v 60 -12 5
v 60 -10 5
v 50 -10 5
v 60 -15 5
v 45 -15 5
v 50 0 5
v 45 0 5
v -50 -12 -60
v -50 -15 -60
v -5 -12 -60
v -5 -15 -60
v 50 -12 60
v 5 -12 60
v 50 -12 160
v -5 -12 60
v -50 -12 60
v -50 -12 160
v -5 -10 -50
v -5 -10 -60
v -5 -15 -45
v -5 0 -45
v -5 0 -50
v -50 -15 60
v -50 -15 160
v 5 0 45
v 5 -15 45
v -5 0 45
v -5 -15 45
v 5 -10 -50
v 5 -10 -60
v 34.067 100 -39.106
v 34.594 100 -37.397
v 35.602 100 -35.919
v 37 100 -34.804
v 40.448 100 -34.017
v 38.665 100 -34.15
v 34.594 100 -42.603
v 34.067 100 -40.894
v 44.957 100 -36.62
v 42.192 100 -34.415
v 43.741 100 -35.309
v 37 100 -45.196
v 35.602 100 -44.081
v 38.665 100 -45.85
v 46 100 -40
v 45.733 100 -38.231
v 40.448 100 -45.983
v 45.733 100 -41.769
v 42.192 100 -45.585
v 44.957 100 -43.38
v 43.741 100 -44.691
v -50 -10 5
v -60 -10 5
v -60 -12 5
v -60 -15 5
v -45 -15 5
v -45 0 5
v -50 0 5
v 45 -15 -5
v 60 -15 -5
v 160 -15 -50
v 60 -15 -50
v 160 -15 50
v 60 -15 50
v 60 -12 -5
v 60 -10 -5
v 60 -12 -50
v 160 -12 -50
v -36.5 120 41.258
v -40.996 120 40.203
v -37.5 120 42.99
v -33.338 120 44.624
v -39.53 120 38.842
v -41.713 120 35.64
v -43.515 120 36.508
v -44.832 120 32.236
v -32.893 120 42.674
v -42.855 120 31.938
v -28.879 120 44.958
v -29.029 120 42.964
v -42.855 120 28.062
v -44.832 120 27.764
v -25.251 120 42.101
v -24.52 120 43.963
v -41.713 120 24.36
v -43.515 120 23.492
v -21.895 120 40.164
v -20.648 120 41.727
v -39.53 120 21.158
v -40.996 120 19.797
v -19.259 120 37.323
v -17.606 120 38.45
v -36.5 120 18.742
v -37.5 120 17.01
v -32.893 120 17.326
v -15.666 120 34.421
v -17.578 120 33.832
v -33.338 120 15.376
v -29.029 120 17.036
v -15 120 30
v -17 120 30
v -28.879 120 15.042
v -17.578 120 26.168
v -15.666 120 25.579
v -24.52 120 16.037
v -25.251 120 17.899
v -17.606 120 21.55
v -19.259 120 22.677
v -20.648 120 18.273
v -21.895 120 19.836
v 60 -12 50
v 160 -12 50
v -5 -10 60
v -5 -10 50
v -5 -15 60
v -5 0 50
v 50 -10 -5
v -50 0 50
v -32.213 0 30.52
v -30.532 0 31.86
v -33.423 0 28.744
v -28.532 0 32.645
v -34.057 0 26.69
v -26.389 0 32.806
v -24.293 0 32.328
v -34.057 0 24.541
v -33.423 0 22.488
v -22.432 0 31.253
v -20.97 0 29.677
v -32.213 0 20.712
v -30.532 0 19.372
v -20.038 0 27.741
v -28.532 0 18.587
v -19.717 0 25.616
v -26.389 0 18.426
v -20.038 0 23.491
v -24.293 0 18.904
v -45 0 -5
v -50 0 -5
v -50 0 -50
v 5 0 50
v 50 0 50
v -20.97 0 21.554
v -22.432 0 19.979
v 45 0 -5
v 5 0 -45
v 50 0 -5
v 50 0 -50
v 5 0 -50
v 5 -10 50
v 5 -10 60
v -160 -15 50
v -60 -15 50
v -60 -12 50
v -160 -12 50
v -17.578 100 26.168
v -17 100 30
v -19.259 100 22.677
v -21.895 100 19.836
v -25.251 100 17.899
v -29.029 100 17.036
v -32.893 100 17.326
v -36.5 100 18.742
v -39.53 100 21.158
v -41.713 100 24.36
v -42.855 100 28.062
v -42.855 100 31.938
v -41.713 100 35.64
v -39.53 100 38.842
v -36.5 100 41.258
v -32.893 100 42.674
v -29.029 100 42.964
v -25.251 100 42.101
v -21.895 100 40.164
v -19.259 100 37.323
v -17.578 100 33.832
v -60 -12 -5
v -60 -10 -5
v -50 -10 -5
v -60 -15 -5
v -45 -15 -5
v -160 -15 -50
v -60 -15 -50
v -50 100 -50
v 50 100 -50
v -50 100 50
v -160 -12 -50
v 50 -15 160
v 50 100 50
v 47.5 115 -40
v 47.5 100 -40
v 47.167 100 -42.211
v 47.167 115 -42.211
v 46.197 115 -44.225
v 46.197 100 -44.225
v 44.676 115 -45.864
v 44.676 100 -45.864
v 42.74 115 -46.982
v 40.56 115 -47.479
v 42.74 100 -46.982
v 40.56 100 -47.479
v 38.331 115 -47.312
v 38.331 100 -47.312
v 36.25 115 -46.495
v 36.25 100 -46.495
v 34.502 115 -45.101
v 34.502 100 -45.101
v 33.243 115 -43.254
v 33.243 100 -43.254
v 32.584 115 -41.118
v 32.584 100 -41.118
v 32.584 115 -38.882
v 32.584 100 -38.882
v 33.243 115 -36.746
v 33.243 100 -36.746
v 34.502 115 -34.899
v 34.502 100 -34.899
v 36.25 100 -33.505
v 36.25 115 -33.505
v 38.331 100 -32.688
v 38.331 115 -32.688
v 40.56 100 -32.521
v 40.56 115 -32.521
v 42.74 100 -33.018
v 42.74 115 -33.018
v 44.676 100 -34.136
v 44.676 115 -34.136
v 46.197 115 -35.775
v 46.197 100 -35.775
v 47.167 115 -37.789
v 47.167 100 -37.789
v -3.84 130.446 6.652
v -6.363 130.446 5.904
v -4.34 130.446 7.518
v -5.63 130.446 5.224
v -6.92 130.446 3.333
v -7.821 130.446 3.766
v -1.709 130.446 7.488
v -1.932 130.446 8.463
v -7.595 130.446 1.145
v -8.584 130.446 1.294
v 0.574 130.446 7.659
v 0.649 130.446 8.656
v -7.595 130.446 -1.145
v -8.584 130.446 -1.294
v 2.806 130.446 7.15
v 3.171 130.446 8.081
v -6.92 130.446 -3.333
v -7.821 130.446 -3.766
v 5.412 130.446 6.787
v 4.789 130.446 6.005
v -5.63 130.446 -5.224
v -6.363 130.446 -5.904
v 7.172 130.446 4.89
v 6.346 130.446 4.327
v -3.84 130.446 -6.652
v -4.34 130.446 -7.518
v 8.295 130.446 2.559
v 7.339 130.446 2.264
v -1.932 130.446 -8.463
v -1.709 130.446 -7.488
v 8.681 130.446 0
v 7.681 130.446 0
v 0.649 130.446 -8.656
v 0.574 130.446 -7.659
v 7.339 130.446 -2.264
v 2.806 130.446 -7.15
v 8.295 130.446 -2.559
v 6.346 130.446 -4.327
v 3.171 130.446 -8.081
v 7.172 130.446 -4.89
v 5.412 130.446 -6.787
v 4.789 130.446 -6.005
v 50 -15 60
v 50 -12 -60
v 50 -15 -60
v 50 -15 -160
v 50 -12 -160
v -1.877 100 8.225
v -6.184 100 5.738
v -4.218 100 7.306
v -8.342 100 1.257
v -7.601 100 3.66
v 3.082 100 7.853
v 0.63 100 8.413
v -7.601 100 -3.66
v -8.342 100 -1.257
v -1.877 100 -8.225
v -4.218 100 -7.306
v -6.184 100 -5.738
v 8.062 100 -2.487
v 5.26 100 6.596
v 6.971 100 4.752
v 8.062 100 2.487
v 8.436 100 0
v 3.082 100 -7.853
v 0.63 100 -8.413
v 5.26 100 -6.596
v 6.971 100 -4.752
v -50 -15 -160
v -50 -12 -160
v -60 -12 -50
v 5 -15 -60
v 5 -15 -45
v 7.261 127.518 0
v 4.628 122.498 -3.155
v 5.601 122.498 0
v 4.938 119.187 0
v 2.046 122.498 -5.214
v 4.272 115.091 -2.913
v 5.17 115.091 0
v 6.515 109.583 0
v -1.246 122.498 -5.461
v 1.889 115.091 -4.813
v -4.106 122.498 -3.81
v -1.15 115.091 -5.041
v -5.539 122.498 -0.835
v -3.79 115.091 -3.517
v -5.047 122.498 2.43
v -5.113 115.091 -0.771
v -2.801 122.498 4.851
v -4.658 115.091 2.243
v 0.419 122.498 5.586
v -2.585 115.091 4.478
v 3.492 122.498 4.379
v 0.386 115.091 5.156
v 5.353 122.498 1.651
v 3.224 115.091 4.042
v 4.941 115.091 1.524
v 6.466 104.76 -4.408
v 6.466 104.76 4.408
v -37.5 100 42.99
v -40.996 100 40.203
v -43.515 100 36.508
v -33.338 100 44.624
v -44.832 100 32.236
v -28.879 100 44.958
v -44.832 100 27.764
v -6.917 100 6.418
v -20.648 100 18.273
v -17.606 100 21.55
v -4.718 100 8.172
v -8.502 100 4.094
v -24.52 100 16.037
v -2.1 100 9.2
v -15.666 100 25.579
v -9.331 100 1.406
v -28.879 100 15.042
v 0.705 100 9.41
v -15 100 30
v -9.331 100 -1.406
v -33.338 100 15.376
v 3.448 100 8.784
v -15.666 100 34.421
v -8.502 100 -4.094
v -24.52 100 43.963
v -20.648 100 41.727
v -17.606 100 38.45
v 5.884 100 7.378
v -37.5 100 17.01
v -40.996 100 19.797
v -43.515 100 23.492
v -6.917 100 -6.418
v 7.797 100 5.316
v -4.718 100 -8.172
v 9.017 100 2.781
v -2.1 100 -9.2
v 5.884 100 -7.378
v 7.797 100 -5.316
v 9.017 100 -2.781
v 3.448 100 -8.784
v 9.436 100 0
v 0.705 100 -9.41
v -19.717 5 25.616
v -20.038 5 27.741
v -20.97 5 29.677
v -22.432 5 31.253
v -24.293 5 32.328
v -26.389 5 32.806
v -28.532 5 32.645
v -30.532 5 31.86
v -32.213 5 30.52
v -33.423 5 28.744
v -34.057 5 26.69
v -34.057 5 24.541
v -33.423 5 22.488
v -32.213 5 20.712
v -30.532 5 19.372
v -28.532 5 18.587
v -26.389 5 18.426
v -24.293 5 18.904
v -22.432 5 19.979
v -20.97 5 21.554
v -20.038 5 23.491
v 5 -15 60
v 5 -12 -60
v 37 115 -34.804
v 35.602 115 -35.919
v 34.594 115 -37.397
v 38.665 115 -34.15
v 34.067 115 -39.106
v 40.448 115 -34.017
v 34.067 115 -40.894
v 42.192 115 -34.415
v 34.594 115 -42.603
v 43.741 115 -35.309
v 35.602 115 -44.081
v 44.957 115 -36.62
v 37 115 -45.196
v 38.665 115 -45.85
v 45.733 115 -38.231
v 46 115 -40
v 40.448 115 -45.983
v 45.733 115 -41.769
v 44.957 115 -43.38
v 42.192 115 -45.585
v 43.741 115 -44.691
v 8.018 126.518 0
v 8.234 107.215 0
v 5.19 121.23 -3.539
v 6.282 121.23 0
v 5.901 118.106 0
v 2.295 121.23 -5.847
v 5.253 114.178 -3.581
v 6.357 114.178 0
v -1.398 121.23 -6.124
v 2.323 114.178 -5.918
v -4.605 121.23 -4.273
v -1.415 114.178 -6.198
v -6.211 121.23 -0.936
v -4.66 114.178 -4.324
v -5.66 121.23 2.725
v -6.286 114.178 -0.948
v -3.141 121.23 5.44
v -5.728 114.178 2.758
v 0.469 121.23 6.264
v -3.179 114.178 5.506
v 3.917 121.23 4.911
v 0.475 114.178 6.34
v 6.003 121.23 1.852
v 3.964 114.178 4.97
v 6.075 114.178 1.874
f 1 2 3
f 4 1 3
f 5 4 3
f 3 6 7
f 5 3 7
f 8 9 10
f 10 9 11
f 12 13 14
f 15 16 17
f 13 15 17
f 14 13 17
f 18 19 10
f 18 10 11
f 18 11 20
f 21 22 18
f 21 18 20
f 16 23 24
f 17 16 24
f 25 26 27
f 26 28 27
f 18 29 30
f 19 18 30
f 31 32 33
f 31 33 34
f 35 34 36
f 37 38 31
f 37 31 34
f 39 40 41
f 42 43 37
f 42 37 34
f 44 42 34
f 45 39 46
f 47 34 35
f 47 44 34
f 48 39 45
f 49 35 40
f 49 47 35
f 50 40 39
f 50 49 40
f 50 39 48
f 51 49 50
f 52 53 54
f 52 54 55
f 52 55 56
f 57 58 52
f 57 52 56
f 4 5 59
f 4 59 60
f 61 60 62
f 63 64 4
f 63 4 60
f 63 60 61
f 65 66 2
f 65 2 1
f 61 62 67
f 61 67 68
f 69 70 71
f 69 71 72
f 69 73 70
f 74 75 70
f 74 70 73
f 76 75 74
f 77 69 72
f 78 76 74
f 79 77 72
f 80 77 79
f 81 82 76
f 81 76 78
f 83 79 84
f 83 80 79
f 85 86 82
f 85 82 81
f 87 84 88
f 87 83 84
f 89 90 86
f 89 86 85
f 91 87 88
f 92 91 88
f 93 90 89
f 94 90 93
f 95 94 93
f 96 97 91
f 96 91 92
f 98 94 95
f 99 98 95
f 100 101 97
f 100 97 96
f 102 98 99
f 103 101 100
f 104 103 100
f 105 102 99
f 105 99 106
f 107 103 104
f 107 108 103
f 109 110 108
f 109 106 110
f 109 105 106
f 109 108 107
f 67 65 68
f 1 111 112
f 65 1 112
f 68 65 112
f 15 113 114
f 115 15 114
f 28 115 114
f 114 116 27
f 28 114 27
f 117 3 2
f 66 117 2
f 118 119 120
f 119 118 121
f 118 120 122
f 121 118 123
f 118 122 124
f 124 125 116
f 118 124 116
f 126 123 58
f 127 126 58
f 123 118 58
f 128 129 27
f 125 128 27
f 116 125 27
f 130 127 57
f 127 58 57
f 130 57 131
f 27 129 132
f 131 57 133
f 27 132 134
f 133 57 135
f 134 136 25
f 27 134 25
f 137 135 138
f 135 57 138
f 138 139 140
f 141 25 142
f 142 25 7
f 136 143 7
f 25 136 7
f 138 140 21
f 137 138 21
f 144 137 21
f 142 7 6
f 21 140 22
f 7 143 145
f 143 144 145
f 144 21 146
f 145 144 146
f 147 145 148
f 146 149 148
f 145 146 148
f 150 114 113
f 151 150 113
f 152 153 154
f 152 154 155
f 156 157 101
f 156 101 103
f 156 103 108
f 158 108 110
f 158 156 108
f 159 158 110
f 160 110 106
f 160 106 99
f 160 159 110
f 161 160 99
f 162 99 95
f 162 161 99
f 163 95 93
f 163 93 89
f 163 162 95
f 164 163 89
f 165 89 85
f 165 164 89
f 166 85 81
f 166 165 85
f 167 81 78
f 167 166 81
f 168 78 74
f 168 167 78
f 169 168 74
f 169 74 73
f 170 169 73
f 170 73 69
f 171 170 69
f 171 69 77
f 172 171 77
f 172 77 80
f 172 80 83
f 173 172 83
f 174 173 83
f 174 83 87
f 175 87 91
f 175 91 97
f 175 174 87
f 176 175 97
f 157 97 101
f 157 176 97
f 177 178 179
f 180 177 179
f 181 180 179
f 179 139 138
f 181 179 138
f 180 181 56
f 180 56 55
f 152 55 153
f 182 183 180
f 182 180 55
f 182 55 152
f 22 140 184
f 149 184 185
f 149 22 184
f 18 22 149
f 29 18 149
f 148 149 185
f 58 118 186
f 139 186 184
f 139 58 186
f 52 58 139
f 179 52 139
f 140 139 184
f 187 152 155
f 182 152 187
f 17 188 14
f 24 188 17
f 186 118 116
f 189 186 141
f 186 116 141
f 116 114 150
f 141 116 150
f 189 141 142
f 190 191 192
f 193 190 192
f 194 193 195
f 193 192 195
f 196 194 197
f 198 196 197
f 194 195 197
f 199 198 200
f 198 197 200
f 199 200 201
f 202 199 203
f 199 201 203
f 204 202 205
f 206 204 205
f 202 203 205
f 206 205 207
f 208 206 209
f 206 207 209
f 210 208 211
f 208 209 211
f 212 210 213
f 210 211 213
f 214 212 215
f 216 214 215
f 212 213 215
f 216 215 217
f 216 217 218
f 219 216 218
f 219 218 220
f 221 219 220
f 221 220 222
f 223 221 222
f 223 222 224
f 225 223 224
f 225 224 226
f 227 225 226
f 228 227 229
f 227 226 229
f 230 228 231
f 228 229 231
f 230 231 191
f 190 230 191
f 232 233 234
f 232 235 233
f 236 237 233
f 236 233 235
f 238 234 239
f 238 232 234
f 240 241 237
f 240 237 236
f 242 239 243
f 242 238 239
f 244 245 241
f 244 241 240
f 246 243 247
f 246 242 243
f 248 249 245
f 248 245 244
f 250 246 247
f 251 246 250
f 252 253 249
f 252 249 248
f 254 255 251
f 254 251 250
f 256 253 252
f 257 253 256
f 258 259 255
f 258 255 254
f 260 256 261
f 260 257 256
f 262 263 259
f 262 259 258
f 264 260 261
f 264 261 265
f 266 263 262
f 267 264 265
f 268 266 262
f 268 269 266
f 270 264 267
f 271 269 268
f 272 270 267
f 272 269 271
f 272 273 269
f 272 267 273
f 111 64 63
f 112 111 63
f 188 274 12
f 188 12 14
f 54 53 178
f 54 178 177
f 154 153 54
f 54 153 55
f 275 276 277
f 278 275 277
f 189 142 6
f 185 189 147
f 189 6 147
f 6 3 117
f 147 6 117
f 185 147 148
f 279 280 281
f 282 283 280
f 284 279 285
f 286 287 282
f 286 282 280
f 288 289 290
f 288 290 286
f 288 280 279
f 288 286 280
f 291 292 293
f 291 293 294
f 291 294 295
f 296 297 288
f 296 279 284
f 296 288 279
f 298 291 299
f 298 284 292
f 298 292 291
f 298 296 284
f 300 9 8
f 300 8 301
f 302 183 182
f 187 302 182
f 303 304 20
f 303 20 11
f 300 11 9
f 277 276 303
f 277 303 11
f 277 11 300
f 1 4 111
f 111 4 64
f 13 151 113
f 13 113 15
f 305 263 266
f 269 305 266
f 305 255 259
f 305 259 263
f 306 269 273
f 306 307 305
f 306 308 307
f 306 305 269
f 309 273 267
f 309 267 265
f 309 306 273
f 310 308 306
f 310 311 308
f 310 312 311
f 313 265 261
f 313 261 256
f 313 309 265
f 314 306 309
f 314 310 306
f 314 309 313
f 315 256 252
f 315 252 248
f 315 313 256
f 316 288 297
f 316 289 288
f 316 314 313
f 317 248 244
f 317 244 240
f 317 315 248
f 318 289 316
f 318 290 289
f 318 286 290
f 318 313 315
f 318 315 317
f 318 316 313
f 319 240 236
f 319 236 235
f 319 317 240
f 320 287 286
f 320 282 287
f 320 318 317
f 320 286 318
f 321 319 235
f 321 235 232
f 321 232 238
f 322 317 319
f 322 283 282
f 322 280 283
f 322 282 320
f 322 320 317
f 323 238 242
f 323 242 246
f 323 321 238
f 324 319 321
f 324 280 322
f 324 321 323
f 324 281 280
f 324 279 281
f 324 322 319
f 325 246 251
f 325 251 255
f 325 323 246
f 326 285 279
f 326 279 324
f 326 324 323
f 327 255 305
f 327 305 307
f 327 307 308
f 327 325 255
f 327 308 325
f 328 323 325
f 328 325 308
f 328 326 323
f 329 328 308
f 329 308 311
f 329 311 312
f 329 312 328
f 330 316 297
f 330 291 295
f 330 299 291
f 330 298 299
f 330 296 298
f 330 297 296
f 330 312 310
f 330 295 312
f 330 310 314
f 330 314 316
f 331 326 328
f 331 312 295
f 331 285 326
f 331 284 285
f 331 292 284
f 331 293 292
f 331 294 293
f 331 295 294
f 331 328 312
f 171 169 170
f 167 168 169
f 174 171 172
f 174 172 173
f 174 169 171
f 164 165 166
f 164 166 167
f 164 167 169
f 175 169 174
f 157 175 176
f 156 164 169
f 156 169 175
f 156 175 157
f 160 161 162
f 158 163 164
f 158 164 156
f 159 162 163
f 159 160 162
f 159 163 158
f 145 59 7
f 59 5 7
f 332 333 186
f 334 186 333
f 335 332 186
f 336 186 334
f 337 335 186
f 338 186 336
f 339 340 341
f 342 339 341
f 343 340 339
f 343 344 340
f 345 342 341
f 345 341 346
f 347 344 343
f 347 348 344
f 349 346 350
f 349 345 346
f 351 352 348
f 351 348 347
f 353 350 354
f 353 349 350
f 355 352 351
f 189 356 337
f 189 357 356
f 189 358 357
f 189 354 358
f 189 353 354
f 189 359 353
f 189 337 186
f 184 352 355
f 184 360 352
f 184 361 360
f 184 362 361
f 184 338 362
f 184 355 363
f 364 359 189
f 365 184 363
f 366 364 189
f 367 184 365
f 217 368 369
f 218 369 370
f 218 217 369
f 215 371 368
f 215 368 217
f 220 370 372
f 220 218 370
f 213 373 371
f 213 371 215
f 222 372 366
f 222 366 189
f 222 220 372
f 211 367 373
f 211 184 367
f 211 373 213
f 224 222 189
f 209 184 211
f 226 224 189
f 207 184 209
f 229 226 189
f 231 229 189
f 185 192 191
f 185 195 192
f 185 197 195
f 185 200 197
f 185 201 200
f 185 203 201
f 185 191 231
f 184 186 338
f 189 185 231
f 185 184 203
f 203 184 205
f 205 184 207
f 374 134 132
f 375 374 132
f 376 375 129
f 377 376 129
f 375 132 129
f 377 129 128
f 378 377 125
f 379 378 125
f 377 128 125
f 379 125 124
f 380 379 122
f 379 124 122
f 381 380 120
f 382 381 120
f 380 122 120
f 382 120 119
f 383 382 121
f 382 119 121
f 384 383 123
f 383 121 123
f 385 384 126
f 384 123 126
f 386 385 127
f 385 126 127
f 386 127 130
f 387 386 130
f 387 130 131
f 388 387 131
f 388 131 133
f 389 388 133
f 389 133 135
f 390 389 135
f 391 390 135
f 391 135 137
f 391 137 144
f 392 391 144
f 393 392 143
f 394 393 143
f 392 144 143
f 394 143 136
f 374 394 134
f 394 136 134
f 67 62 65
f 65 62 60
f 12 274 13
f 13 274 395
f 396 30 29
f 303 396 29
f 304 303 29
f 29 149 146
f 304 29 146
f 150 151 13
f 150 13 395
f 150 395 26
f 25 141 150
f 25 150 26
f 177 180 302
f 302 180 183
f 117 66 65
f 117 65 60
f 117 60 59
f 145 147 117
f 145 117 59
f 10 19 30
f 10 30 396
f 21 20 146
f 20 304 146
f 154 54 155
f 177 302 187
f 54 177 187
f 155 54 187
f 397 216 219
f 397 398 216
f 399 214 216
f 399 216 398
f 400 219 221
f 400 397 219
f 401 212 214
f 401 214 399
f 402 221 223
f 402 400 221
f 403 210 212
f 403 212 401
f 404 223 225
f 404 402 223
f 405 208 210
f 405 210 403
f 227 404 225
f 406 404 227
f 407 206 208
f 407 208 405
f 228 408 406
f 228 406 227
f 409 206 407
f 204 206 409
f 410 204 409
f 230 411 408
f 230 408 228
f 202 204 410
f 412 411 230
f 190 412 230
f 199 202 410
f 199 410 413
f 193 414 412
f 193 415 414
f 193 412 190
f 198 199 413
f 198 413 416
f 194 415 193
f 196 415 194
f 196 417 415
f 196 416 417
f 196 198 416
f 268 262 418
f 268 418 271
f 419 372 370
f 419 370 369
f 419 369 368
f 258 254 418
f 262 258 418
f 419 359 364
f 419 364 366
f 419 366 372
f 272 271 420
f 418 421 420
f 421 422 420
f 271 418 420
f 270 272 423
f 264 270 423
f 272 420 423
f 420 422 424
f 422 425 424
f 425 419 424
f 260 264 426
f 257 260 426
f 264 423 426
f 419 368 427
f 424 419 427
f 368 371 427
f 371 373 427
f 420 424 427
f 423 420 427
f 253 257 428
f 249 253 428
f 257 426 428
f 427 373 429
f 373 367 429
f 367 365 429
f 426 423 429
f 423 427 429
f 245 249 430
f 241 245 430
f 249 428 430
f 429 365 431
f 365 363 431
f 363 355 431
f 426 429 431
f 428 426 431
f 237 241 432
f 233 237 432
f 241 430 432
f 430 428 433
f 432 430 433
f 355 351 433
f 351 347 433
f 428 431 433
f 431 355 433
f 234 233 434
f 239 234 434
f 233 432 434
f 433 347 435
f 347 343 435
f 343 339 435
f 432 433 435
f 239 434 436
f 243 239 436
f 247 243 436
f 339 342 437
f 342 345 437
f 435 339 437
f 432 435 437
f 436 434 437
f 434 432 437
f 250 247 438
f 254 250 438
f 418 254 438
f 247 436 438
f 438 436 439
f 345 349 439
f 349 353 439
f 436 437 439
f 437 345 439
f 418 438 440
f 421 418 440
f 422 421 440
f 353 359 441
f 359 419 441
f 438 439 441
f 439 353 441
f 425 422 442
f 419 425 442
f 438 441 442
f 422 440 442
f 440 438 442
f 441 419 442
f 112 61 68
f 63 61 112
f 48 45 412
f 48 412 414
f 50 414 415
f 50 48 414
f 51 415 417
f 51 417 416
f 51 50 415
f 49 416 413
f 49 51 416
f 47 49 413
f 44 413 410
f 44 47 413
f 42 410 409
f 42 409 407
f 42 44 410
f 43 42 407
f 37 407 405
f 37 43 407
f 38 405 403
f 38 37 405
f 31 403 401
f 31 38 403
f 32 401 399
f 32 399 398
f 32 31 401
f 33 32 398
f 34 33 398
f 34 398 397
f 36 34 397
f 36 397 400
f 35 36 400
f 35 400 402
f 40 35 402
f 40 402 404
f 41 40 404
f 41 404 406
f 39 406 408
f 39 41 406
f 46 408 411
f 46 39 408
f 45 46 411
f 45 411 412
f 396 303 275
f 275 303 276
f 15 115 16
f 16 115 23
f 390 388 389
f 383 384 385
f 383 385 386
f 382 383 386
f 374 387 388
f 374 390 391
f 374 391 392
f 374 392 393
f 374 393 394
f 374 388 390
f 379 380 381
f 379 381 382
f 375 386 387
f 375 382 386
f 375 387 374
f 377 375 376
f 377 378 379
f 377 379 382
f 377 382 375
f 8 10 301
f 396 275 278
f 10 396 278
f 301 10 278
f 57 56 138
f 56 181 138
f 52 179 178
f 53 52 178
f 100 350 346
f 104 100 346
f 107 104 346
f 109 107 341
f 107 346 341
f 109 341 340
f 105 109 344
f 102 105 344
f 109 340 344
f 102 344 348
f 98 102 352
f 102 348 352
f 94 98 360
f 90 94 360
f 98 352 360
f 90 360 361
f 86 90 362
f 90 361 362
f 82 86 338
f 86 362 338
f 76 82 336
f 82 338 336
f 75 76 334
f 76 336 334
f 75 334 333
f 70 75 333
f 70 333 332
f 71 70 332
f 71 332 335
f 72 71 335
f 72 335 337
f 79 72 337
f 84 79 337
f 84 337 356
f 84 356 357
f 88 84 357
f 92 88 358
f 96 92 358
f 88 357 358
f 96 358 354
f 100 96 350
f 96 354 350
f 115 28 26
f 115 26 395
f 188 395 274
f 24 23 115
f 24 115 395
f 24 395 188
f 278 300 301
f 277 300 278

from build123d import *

# Parameters (mm, degrees)
SKETCH_1_W               = 100
SKETCH_1_H               = 100
EXTRUDE_1_DEPTH          = 100
EXTRUDE_2_DEPTH          = 5
SKETCH_4_W               = 100
SKETCH_4_H               = 100
EXTRUDE_3_DEPTH          = 3
PATTERN_CIRCULAR_1_COUNT = 4
SKETCH_7_R               = 15
SKETCH_7_R_2             = 13
EXTRUDE_5_DEPTH          = 20
SKETCH_8_R               = 7.5
SKETCH_8_R_2             = 6
EXTRUDE_6_DEPTH          = 15
SKETCH_11_R              = 7.210019968
CUT_EXTRUDE_2_DEPTH      = 5


with BuildPart() as part:
    # Эскиз1 → Бобышка-Вытянуть1 (new body)
    with BuildSketch(Plane(origin=(0, 0, 0), x_dir=(1, 0, 0), z_dir=(0, 1, 0))):
        Rectangle(SKETCH_1_W, SKETCH_1_H)
    extrude(amount=EXTRUDE_1_DEPTH)

    # Эскиз3 → Бобышка-Вытянуть2 (add, symmetric)
    with BuildSketch(Plane.XY):
        Polygon((60, -10), (60, -15), (45, -15), (45, 0), (50, 0), (50, -10), align=None)
    extrude_2 = extrude(amount=EXTRUDE_2_DEPTH, both=True)

    # Эскиз4 → Бобышка-Вытянуть3 (add)
    with BuildSketch(Plane.XZ.offset(15)):
        with Locations((110, 0)):
            Rectangle(SKETCH_4_W, SKETCH_4_H)
    extrude_3 = extrude(amount=-EXTRUDE_3_DEPTH)

    # Круговой массив1: Бобышка-Вытянуть2, Бобышка-Вытянуть3 ×4 about axis
    pattern_circular_1_axis = Axis((0, 0, 0), (0, 1, 0))
    for i in range(1, PATTERN_CIRCULAR_1_COUNT):
        add(extrude_2.rotate(pattern_circular_1_axis, i * 360 / PATTERN_CIRCULAR_1_COUNT))
        add(extrude_3.rotate(pattern_circular_1_axis, i * 360 / PATTERN_CIRCULAR_1_COUNT))

    # Эскиз7 → Бобышка-Вытянуть5 (add)
    with BuildSketch(Plane(origin=(0, 100, 0), x_dir=(1, 0, 0), z_dir=(0, 1, 0))):
        with Locations((-30, -30)):
            Circle(SKETCH_7_R)
        with Locations((-30, -30)):
            Circle(SKETCH_7_R_2, mode=Mode.SUBTRACT)
    extrude(amount=EXTRUDE_5_DEPTH)

    # Эскиз8 → Бобышка-Вытянуть6 (add)
    with BuildSketch(Plane(origin=(0, 100, 0), x_dir=(1, 0, 0), z_dir=(0, 1, 0))):
        with Locations((40, 40)):
            Circle(SKETCH_8_R)
        with Locations((40, 40)):
            Circle(SKETCH_8_R_2, mode=Mode.SUBTRACT)
    extrude(amount=EXTRUDE_6_DEPTH)

    # Эскиз10 → Повернуть1 (revolve)
    with BuildSketch(Plane.XY):
        with BuildLine():
            Line((8.680645457, 130.445795914), (7.680645457, 130.445795914))
            add(Edge.make_bspline(
                [(7.680645457, 130.445795914), (7.680645457, 127.036197798), (1.669418546, 117.303060729), (8.436480148, 106.717484225), (8.436480148, 100)],
                knots=[0, 0, 0, 0, 0.331036339, 1, 1, 1, 1], degree=3))
            Line((8.436480148, 100), (9.436480148, 100))
            add(Edge.make_bspline(
                [(8.680645457, 130.445795914), (8.680645457, 129.743031745), (8.522630114, 128.322957752), (7.990188694, 126.341389545), (7.322411145, 124.435424215), (6.663640941, 122.600134826), (6.143869676, 120.828668813), (5.810471482, 118.538078927), (6.008246237, 115.536453962), (6.892964845, 111.786431822), (8.442762115, 106.643818661), (9.436480148, 102.680139866), (9.436480148, 100)],
                knots=[0, 0, 0, 0, 0.0625, 0.125, 0.1875, 0.25, 0.3125, 0.375, 0.5, 0.625, 0.75, 1, 1, 1, 1], degree=3))
        make_face()
    revolve(axis=Axis((0, 100, 0), (0, 1, 0)))

    # Эскиз11 → Вырез-Вытянуть2 (cut)
    with BuildSketch(Plane.XZ):
        with Locations((-26.927393067, 25.615882257)):
            Circle(SKETCH_11_R)
    extrude(amount=-CUT_EXTRUDE_2_DEPTH, mode=Mode.SUBTRACT)


solid = part.part
